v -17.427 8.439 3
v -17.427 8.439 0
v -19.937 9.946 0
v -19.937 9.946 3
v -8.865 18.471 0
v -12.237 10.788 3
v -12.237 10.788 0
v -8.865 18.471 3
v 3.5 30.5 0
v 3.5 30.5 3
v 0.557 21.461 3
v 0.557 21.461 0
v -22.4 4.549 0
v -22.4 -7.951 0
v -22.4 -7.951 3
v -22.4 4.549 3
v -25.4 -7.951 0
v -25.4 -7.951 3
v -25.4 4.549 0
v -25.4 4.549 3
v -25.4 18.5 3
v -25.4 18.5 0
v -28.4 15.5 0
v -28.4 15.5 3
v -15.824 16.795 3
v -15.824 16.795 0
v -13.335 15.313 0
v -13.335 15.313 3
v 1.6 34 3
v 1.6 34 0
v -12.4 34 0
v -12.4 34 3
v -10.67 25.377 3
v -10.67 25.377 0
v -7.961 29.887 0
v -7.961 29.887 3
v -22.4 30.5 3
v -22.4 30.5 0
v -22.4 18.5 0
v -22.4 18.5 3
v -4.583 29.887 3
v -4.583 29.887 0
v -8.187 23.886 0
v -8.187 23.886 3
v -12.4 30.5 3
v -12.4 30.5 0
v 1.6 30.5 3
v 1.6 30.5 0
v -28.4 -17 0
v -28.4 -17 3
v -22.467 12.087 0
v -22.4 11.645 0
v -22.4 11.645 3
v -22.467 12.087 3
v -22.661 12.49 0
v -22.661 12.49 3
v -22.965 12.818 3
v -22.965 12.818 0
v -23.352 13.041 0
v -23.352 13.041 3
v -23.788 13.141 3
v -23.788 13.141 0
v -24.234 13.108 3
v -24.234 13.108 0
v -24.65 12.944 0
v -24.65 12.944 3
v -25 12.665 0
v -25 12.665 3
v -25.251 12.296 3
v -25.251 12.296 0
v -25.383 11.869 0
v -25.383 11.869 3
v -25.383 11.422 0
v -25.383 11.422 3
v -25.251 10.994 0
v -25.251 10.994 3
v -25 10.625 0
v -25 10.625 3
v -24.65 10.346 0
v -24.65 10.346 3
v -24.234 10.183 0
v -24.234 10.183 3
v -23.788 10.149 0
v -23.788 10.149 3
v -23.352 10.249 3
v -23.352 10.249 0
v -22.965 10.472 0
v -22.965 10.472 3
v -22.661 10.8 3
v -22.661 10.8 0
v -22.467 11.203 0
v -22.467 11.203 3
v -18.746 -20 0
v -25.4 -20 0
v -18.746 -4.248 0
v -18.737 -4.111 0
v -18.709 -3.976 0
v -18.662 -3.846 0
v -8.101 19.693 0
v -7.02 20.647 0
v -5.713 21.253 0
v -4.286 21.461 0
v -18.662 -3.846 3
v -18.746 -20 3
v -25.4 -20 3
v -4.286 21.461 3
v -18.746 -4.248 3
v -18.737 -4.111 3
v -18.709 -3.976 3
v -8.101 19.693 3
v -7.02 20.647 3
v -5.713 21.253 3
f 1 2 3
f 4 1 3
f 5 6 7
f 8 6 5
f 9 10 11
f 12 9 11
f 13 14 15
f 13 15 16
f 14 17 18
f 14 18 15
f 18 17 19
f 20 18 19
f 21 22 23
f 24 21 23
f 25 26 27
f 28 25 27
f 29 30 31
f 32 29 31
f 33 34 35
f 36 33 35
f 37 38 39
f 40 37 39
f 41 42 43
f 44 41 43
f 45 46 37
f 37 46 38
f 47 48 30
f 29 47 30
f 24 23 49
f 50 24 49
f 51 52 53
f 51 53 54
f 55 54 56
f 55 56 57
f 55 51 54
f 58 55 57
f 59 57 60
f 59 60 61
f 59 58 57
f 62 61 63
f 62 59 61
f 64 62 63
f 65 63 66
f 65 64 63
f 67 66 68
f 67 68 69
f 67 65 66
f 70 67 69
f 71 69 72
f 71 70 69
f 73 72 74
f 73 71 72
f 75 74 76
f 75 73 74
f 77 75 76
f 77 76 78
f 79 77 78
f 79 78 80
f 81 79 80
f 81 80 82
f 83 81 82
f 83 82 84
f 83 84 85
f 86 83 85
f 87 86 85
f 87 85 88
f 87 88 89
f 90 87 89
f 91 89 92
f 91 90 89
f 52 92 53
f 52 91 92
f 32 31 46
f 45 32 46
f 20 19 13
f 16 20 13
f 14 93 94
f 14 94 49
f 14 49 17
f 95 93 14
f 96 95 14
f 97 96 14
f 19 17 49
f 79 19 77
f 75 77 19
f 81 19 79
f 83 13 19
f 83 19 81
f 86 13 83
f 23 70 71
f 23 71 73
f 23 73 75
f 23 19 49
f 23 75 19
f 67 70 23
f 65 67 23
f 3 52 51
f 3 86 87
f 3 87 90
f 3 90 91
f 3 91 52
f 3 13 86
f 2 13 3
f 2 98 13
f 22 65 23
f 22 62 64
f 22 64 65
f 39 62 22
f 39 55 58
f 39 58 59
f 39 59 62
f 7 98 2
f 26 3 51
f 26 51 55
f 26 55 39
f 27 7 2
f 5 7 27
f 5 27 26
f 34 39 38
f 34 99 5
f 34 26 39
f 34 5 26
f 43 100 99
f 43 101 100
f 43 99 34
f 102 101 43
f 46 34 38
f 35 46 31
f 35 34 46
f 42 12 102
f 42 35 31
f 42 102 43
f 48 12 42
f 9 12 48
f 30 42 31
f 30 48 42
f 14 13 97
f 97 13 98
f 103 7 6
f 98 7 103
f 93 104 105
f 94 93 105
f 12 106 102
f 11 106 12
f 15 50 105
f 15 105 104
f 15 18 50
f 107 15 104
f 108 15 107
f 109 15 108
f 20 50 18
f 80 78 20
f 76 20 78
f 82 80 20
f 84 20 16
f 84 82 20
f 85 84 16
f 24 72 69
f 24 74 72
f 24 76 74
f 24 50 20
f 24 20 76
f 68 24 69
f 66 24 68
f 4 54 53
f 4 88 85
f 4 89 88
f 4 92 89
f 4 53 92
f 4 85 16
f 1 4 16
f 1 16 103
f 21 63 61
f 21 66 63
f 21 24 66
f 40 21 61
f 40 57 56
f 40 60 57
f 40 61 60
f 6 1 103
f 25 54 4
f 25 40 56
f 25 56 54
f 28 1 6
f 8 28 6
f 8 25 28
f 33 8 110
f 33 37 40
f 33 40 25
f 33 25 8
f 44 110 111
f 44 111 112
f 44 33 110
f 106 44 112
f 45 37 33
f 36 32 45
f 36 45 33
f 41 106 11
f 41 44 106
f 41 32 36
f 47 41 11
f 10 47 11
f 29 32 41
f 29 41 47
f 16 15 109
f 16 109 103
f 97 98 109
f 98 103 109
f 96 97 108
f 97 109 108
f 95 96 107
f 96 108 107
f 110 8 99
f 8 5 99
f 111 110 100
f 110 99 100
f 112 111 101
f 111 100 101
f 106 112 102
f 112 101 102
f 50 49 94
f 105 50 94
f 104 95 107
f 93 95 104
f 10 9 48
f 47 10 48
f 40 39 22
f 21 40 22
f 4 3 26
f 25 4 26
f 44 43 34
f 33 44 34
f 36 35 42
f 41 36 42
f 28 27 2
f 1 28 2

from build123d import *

# Parameters (mm, degrees)
SKETCH_1_R           = 1.5
SKETCH_1_W           = 3
SKETCH_1_H           = 12.5
EXTRUDE_1_DEPTH      = 3
SKETCH_2_W           = 3
SKETCH_2_H           = 15
SKETCH_2_H_2         = 10
CUT_EXTRUDE_1_DEPTH  = 5
CUT_EXTRUDE_2_DEPTH  = 45.402252195
CUT_EXTRUDE_3_DEPTH  = 10
CUT_EXTRUDE_4_DEPTH  = 10
EXTRUDE_2_DEPTH      = 3
EXTRUDE_3_DEPTH      = 3
CUT_EXTRUDE_5_DEPTH  = 8
FILLET_2_R           = 5
EXTRUDE_START        = -3
EXTRUDE_4_DEPTH      = 3
FILLET_3_R           = 2
EXTRUDE_5_DEPTH      = 3
FILLET_4_R           = 2
CUT_EXTRUDE_6_DEPTH  = 6
CUT_EXTRUDE_7_DEPTH  = 10
CUT_EXTRUDE_8_DEPTH  = 10
SKETCH_17_W          = 7
SKETCH_17_H          = 6.292526031
CUT_EXTRUDE_9_DEPTH  = 5
SKETCH_18_W          = 19.9
SKETCH_18_H          = 3.108254453
CUT_EXTRUDE_10_DEPTH = 45.402252195
EXTRUDE_6_DEPTH      = 3
SKETCH_20_W          = 3
SKETCH_20_H          = 12.985743467
EXTRUDE_7_DEPTH      = 7
EXTRUDE_9_DEPTH      = 3
EXTRUDE_10_DEPTH     = 5
EXTRUDE_11_DEPTH     = 3
FILLET_7_R           = 5
CUT_EXTRUDE_11_DEPTH = 10
FILLET_8_R           = 10
CUT_EXTRUDE_13_DEPTH = 10
SKETCH_32_W          = 3
SKETCH_32_H          = 8.565761419
EXTRUDE_12_DEPTH     = 0.5
FILLET_10_R          = 3
SKETCH_33_W          = 3
SKETCH_33_H          = 9.039454816
CUT_EXTRUDE_14_DEPTH = 5
CUT_EXTRUDE_15_DEPTH = 10
CUT_EXTRUDE_START    = -10
CUT_EXTRUDE_16_DEPTH = 10
CUT_EXTRUDE_18_DEPTH = 3
CUT_EXTRUDE_19_DEPTH = 10
CUT_EXTRUDE_20_DEPTH = 10
FILLET_11_R          = 1


with BuildPart() as part:
    # 草图1 → 凸台-拉伸1 (new body)
    with BuildSketch(Plane.XY):
        Polygon((-28.4, -17), (-25.4, -20), (-22.4, -20), (-22.4, -27.5), (17.4, -27.5), (17.4, -20), (22.4, -20), (22.4, -5), (17.4, -5), (17.4, 10), (22.4, 10), (22.4, 20), (17.4, 20), (17.4, 30.5), (1.6, 30.5), (1.6, 34), (-12.4, 34), (-12.4, 30.5), (-22.4, 30.5), (-22.4, 18.5), (-25.4, 18.5), (-28.4, 15.5), align=None)
        with Locations((-23.9, 11.645115951)):
            Circle(SKETCH_1_R, mode=Mode.SUBTRACT)
        with Locations((-23.9, -1.701184373)):
            Rectangle(SKETCH_1_W, SKETCH_1_H, mode=Mode.SUBTRACT)
        with BuildLine():
            Line((-0.943408492, 20.723063417), (-16.494006981, -16.074007029))
            ThreePointArc((-16.494006981, -16.074007029), (-16.597951499, -16.391745547), (-16.647518347, -16.722359153))
            Line((-16.647518347, -16.722359153), (-16.87747423, -20.247507648))
            ThreePointArc((-16.87747423, -20.247507648), (-16.341232813, -21.745107114), (-14.881716036, -22.377696869))
            Line((-14.881716036, -22.377696869), (7.4, -22.377696869))
            ThreePointArc((7.4, -22.377696869), (8.814213562, -21.791910432), (9.4, -20.377696869))
            Line((9.4, -20.377696869), (9.4, 19.944522071))
            ThreePointArc((9.4, 19.944522071), (8.814213562, 21.358735634), (7.4, 21.944522071))
            Line((7.4, 21.944522071), (0.898838335, 21.944522071))
            ThreePointArc((0.898838335, 21.944522071), (-0.206357871, 21.611417792), (-0.943408492, 20.723063417))
        make_face(mode=Mode.SUBTRACT)
    extrude(amount=EXTRUDE_1_DEPTH)

    # 草图2 → 切除-拉伸1 (cut)
    with BuildSketch(Plane(origin=(22.4, 0, 0), x_dir=(0, 0, -1), z_dir=(1, 0, 0))):
        with Locations((-1.5, -12.5)):
            Rectangle(SKETCH_2_W, SKETCH_2_H)
        with Locations((-1.5, 15)):
            Rectangle(SKETCH_2_W, SKETCH_2_H_2)
    extrude(amount=-CUT_EXTRUDE_1_DEPTH, mode=Mode.SUBTRACT)

    # 草图4 → 切除-拉伸2 (cut, through all)
    with BuildSketch(Plane(origin=(0, 0, 0), x_dir=(-1, 0, 0), z_dir=(0, 0, -1))):
        Polygon((-7.4, 21.944522071), (-17.4, 21.944522071), (-17.4, 1.5), (-9.4, 1.5), align=None)
    extrude(amount=-CUT_EXTRUDE_2_DEPTH, mode=Mode.SUBTRACT)

    # 草图5 → 切除-拉伸3 (cut)
    with BuildSketch(Plane(origin=(0, 0, 0), x_dir=(-1, 0, 0), z_dir=(0, 0, -1))):
        Polygon((-7.4, -22.377696869), (-17.4, -22.377696869), (-17.4, 1.5), (-9.4, 1.5), align=None)
    extrude(amount=-CUT_EXTRUDE_3_DEPTH, mode=Mode.SUBTRACT)

    # 草图6 → 切除-拉伸4 (cut)
    with BuildSketch(Plane(origin=(0, 0, 0), x_dir=(-1, 0, 0), z_dir=(0, 0, -1))):
        Polygon((-0.898838335, 21.944522071), (10.541314431, 21.944522071), (16.597951499, -16.391745547), align=None)
    extrude(amount=-CUT_EXTRUDE_4_DEPTH, mode=Mode.SUBTRACT)

    # 草图8 → 凸台-拉伸2 (add)
    with BuildSketch(Plane(origin=(0, 0, 0), x_dir=(-1, 0, 0), z_dir=(0, 0, -1))):
        with BuildLine():
            Line((14.881716036, -22.377696869), (-17.4, -22.377696869))
            Line((-17.4, -22.377696869), (-17.4, -16.722359153))
            Line((-17.4, -16.722359153), (16.647518347, -16.722359153))
            Line((16.647518347, -16.722359153), (16.87747423, -20.247507648))
            ThreePointArc((16.87747423, -20.247507648), (16.341232813, -21.745107114), (14.881716036, -22.377696869))
        make_face()
    extrude(amount=-EXTRUDE_2_DEPTH)

    # 草图9 → 凸台-拉伸3 (add)
    with BuildSketch(Plane(origin=(0, 0, 0), x_dir=(-1, 0, 0), z_dir=(0, 0, -1))):
        with BuildLine():
            Line((16.647518347, -16.722359153), (-17.4, -16.722359153))
            Line((-17.4, -16.722359153), (-17.4, -16.391745547))
            Line((-17.4, -16.391745547), (16.597951499, -16.391745547))
            ThreePointArc((16.597951499, -16.391745547), (16.629654964, -16.556014871), (16.647518347, -16.722359153))
        make_face()
    extrude(amount=-EXTRUDE_3_DEPTH)

    # 草图10 → 切除-拉伸5 (cut)
    with BuildSketch(Plane(origin=(0, 0, 0), x_dir=(-1, 0, 0), z_dir=(0, 0, -1))):
        Polygon((16.597951499, -16.391745547), (-17.4, -16.391745547), (-17.4, -18.391745547), (16.913925768, -18.391745547), align=None)
    extrude(amount=-CUT_EXTRUDE_5_DEPTH, mode=Mode.SUBTRACT)

    # 圆角2
    fillet_2_edges = [part.edges().sort_by_distance(p)[0] for p in [
        (-10.541314431, 21.944522071, 1.5),
    ]]
    fillet(fillet_2_edges, radius=FILLET_2_R)

    # 草图11 → 凸台-拉伸4 (add)
    with BuildSketch(Plane(origin=(0, 0, 0), x_dir=(-1, 0, 0), z_dir=(0, 0, -1)).offset(EXTRUDE_START)):
        with BuildLine():
            Line((6.269234856, 21.944522071), (11.207979364, 17.724780164))
            ThreePointArc((11.207979364, 17.724780164), (9.517211883, 20.745922501), (6.269234856, 21.944522071))
        make_face()
    extrude(amount=EXTRUDE_4_DEPTH)

    # 圆角3
    fillet_3_edges = [part.edges().sort_by_distance(p)[0] for p in [
        (-6.269234856, 21.944522071, 1.5),
        (-11.207979364, 17.724780164, 1.5),
    ]]
    fillet(fillet_3_edges, radius=FILLET_3_R)

    # 草图12 → 凸台-拉伸5 (add)
    with BuildSketch(Plane.XY.offset(3)):
        with BuildLine():
            Line((-7.981733094, 20.481336322), (-10.646847695, 18.204219992))
            ThreePointArc((-10.646847695, 18.204219992), (-11.092932914, 17.660394983), (-11.323154687, 16.995763057))
            Line((-11.323154687, 16.995763057), (-12.341298757, 10.55128849))
            Line((-12.341298757, 10.55128849), (-7.981733094, 20.481336322))
        make_face()
    extrude(amount=-EXTRUDE_5_DEPTH)

    # 圆角4
    fillet_4_edges = [part.edges().sort_by_distance(p)[0] for p in [
        (-7.981733094, 20.481336322, 1.5),
        (-12.341298757, 10.55128849, 1.5),
    ]]
    fillet(fillet_4_edges, radius=FILLET_4_R)

    # 草图14 → 切除-拉伸6 (cut)
    with BuildSketch(Plane.XY.offset(3)):
        with BuildLine():
            Line((-8.165767584, 20.062149772), (-6.345855602, 24.207473969))
            Line((-6.345855602, 24.207473969), (17.4, 24.207473969))
            Line((17.4, 24.207473969), (17.4, 21.944522071))
            Line((17.4, 21.944522071), (-5.531175714, 21.944522071))
            ThreePointArc((-5.531175714, 21.944522071), (-6.223591649, 21.820837655), (-6.830366525, 21.465082243))
            Line((-6.830366525, 21.465082243), (-7.633672538, 20.7787248))
            ThreePointArc((-7.633672538, 20.7787248), (-7.940203056, 20.450498062), (-8.165767584, 20.062149772))
        make_face()
    extrude(amount=-CUT_EXTRUDE_6_DEPTH, mode=Mode.SUBTRACT)

    # 草图15 → 切除-拉伸7 (cut)
    with BuildSketch(Plane.XY.offset(3)):
        Polygon((17.4, -18.391745547), (17.4, -22.391745547), (-17.545874306, -22.391745547), (-16.913925768, -18.391745547), align=None)
    extrude(amount=-CUT_EXTRUDE_7_DEPTH, mode=Mode.SUBTRACT)

    # 草图16 → 切除-拉伸8 (cut)
    with BuildSketch(Plane.XY.offset(3)):
        Polygon((17.4, -22.391745547), (17.4, -24.391745547), (-17.861848575, -24.391745547), (-17.545874306, -22.391745547), align=None)
    extrude(amount=-CUT_EXTRUDE_8_DEPTH, mode=Mode.SUBTRACT)

    # 草图17 → 切除-拉伸9 (cut)
    with BuildSketch(Plane.XY.offset(3)):
        with Locations((13.9, 27.353736985)):
            Rectangle(SKETCH_17_W, SKETCH_17_H)
    extrude(amount=-CUT_EXTRUDE_9_DEPTH, mode=Mode.SUBTRACT)

    # 草图18 → 切除-拉伸10 (cut, through all)
    with BuildSketch(Plane.XY.offset(3)):
        with Locations((7.45, -25.945872773)):
            Rectangle(SKETCH_18_W, SKETCH_18_H)
    extrude(amount=-CUT_EXTRUDE_10_DEPTH, mode=Mode.SUBTRACT)

    # 草图19 → 凸台-拉伸6 (add)
    with BuildSketch(Plane.XY.offset(3)):
        Polygon((10.4, -27.5), (10.4, -14.514256533), (-16.30133239, -14.514256533), (-17.861848575, -24.391745547), (-2.5, -24.391745547), (-2.5, -27.5), align=None)
    extrude(amount=-EXTRUDE_6_DEPTH)

    # 草图20 → 凸台-拉伸7 (add)
    with BuildSketch(Plane(origin=(10.4, 0, 0), x_dir=(0, 0, -1), z_dir=(1, 0, 0))):
        with Locations((-1.5, -21.007128267)):
            Rectangle(SKETCH_20_W, SKETCH_20_H)
    extrude(amount=EXTRUDE_7_DEPTH)

    # 草图22 → 凸台-拉伸9 (add)
    with BuildSketch(Plane.XY.offset(3)):
        Polygon((-16.220086474, -14), (-16.30133239, -14.514256533), (17.4, -14.514256533), (17.4, -14), align=None)
    extrude(amount=-EXTRUDE_9_DEPTH)

    # 草图23 → 凸台-拉伸10 (add)
    with BuildSketch(Plane(origin=(17.4, 0, 0), x_dir=(0, 0, -1), z_dir=(1, 0, 0))):
        Polygon((0, -16.75), (-3, -16.75), (-3, -20.75), (-3, -24.75), (0, -24.75), align=None)
    extrude(amount=EXTRUDE_10_DEPTH)

    # 草图25 → 凸台-拉伸11 (add)
    with BuildSketch(Plane.XY.offset(3)):
        Polygon((10.4, 21.460545184), (10.4, 24.207473969), (-6.345855602, 24.207473969), (-7.551833319, 21.460545184), align=None)
    extrude(amount=-EXTRUDE_11_DEPTH)

    # 圆角7
    fillet_7_edges = [part.edges().sort_by_distance(p)[0] for p in [
        (-7.551833319, 21.460545184, 1.5),
    ]]
    fillet(fillet_7_edges, radius=FILLET_7_R)

    # 草图26 → 切除-拉伸11 (cut)
    with BuildSketch(Plane.XY.offset(3)):
        Polygon((-16.220086474, -14), (-17.468499422, -21.901991212), (12.322607147, -22.558990573), (12.322607147, -14), align=None)
    extrude(amount=-CUT_EXTRUDE_11_DEPTH, mode=Mode.SUBTRACT)

    # 圆角8
    fillet_8_edges = [part.edges().sort_by_distance(p)[0] for p in [
        (-17.468499422, -21.901991212, 1.5),
    ]]
    fillet(fillet_8_edges, radius=FILLET_8_R)

    # 草图30 → 切除-拉伸13 (cut)
    with BuildSketch(Plane.XY.offset(3)):
        Polygon((13.4, -14), (12.322607147, -14), (12.322607147, -22.558990573), (13.4, -22.565761419), align=None)
    extrude(amount=-CUT_EXTRUDE_13_DEPTH, mode=Mode.SUBTRACT)

    # 草图32 → 凸台-拉伸12 (add)
    with BuildSketch(Plane.ZY.offset(-13.4)):
        with Locations((1.5, -18.282880709)):
            Rectangle(SKETCH_32_W, SKETCH_32_H)
    extrude(amount=EXTRUDE_12_DEPTH)

    # 圆角10
    fillet_10_edges = [part.edges().sort_by_distance(p)[0] for p in [
        (12.9, -22.562619183, 1.5),
    ]]
    fillet(fillet_10_edges, radius=FILLET_10_R)

    # 草图33 → 切除-拉伸14 (cut)
    with BuildSketch(Plane(origin=(10.4, 0, 0), x_dir=(0, 0, -1), z_dir=(1, 0, 0))):
        with Locations((-1.5, 25.980272592)):
            Rectangle(SKETCH_33_W, SKETCH_33_H)
    extrude(amount=-CUT_EXTRUDE_14_DEPTH, mode=Mode.SUBTRACT)

    # 草图34 → 切除-拉伸15 (cut)
    with BuildSketch(Plane.XY.offset(3)):
        Polygon((5.4, 30.5), (3.5, 30.5), (0.556836157, 21.460545184), (5.4, 21.460545184), align=None)
    extrude(amount=-CUT_EXTRUDE_15_DEPTH, mode=Mode.SUBTRACT)

    # 草图35 → 切除-拉伸16 (cut)
    with BuildSketch(Plane.XY.offset(3).offset(CUT_EXTRUDE_START)):
        with BuildLine():
            Line((-15.804851594, -12.15767545), (-15.803484574, -27.5))
            Line((-15.803484574, -27.5), (17.4, -27.5))
            Line((17.4, -27.5), (17.4, -24.75))
            Line((17.4, -24.75), (22.4, -24.75))
            Line((22.4, -24.75), (22.4, -16.75))
            Line((22.4, -16.75), (17.4, -16.75))
            Line((17.4, -16.75), (17.4, -14))
            Line((17.4, -14), (12.9, -14))
            Line((12.9, -14), (12.9, -19.50483406))
            ThreePointArc((12.9, -19.50483406), (11.997804375, -21.649412528), (9.833855463, -22.504104788))
            Line((9.833855463, -22.504104788), (-6.025333424, -22.154353531))
            ThreePointArc((-6.025333424, -22.154353531), (-12.953134992, -19.149784154), (-15.804851594, -12.15767545))
        make_face()
    extrude(amount=CUT_EXTRUDE_16_DEPTH, mode=Mode.SUBTRACT)

    # 草图37 → 切除-拉伸18 (cut)
    with BuildSketch(Plane(origin=(173.343153128, -117.958562534, 0), x_dir=(1, 0, 0), z_dir=(0, 0, -1))):
        Polygon((-181.304308857, -147.845632777), (-177.926170185, -147.845632777), (-181.530162889, -141.844696468), (-184.012835358, -143.335719369), align=None)
        Polygon((-189.167141698, -134.753386772), (-186.678220059, -133.271627751), (-190.77061716, -126.39759793), (-193.280214591, -127.904791202), align=None)
    extrude(amount=-CUT_EXTRUDE_18_DEPTH, mode=Mode.SUBTRACT)

    # 草图38 → 切除-拉伸19 (cut)
    with BuildSketch(Plane.XY.offset(3)):
        Polygon((-22.4, -20), (-22.4, -27.5), (-15.803484574, -27.5), (-15.804152833, -20), align=None)
    extrude(amount=-CUT_EXTRUDE_19_DEPTH, mode=Mode.SUBTRACT)

    # 草图39 → 切除-拉伸20 (cut)
    with BuildSketch(Plane.XY.offset(3).offset(CUT_EXTRUDE_START)):
        with BuildLine():
            Line((-12.381626222, 10.296030584), (-12.237414276, 10.787912491))
            Line((-12.237414276, 10.787912491), (-18.746477977, -4.038177739))
            Line((-18.746477977, -4.038177739), (-18.746477977, -20))
            Line((-18.746477977, -20), (-15.804152833, -20))
            Line((-15.804152833, -20), (-15.804851594, -12.15767545))
            ThreePointArc((-15.804851594, -12.15767545), (-15.774211698, -11.374569696), (-15.682340648, -10.596268253))
            Line((-15.682340648, -10.596268253), (-12.381626222, 10.296030584))
        make_face()
    extrude(amount=CUT_EXTRUDE_20_DEPTH, mode=Mode.SUBTRACT)

    # 圆角11
    fillet_11_edges = [part.edges().sort_by_distance(p)[0] for p in [
        (-18.746477977, -4.038177739, 1.5),
    ]]
    fillet(fillet_11_edges, radius=FILLET_11_R)


solid = part.part
